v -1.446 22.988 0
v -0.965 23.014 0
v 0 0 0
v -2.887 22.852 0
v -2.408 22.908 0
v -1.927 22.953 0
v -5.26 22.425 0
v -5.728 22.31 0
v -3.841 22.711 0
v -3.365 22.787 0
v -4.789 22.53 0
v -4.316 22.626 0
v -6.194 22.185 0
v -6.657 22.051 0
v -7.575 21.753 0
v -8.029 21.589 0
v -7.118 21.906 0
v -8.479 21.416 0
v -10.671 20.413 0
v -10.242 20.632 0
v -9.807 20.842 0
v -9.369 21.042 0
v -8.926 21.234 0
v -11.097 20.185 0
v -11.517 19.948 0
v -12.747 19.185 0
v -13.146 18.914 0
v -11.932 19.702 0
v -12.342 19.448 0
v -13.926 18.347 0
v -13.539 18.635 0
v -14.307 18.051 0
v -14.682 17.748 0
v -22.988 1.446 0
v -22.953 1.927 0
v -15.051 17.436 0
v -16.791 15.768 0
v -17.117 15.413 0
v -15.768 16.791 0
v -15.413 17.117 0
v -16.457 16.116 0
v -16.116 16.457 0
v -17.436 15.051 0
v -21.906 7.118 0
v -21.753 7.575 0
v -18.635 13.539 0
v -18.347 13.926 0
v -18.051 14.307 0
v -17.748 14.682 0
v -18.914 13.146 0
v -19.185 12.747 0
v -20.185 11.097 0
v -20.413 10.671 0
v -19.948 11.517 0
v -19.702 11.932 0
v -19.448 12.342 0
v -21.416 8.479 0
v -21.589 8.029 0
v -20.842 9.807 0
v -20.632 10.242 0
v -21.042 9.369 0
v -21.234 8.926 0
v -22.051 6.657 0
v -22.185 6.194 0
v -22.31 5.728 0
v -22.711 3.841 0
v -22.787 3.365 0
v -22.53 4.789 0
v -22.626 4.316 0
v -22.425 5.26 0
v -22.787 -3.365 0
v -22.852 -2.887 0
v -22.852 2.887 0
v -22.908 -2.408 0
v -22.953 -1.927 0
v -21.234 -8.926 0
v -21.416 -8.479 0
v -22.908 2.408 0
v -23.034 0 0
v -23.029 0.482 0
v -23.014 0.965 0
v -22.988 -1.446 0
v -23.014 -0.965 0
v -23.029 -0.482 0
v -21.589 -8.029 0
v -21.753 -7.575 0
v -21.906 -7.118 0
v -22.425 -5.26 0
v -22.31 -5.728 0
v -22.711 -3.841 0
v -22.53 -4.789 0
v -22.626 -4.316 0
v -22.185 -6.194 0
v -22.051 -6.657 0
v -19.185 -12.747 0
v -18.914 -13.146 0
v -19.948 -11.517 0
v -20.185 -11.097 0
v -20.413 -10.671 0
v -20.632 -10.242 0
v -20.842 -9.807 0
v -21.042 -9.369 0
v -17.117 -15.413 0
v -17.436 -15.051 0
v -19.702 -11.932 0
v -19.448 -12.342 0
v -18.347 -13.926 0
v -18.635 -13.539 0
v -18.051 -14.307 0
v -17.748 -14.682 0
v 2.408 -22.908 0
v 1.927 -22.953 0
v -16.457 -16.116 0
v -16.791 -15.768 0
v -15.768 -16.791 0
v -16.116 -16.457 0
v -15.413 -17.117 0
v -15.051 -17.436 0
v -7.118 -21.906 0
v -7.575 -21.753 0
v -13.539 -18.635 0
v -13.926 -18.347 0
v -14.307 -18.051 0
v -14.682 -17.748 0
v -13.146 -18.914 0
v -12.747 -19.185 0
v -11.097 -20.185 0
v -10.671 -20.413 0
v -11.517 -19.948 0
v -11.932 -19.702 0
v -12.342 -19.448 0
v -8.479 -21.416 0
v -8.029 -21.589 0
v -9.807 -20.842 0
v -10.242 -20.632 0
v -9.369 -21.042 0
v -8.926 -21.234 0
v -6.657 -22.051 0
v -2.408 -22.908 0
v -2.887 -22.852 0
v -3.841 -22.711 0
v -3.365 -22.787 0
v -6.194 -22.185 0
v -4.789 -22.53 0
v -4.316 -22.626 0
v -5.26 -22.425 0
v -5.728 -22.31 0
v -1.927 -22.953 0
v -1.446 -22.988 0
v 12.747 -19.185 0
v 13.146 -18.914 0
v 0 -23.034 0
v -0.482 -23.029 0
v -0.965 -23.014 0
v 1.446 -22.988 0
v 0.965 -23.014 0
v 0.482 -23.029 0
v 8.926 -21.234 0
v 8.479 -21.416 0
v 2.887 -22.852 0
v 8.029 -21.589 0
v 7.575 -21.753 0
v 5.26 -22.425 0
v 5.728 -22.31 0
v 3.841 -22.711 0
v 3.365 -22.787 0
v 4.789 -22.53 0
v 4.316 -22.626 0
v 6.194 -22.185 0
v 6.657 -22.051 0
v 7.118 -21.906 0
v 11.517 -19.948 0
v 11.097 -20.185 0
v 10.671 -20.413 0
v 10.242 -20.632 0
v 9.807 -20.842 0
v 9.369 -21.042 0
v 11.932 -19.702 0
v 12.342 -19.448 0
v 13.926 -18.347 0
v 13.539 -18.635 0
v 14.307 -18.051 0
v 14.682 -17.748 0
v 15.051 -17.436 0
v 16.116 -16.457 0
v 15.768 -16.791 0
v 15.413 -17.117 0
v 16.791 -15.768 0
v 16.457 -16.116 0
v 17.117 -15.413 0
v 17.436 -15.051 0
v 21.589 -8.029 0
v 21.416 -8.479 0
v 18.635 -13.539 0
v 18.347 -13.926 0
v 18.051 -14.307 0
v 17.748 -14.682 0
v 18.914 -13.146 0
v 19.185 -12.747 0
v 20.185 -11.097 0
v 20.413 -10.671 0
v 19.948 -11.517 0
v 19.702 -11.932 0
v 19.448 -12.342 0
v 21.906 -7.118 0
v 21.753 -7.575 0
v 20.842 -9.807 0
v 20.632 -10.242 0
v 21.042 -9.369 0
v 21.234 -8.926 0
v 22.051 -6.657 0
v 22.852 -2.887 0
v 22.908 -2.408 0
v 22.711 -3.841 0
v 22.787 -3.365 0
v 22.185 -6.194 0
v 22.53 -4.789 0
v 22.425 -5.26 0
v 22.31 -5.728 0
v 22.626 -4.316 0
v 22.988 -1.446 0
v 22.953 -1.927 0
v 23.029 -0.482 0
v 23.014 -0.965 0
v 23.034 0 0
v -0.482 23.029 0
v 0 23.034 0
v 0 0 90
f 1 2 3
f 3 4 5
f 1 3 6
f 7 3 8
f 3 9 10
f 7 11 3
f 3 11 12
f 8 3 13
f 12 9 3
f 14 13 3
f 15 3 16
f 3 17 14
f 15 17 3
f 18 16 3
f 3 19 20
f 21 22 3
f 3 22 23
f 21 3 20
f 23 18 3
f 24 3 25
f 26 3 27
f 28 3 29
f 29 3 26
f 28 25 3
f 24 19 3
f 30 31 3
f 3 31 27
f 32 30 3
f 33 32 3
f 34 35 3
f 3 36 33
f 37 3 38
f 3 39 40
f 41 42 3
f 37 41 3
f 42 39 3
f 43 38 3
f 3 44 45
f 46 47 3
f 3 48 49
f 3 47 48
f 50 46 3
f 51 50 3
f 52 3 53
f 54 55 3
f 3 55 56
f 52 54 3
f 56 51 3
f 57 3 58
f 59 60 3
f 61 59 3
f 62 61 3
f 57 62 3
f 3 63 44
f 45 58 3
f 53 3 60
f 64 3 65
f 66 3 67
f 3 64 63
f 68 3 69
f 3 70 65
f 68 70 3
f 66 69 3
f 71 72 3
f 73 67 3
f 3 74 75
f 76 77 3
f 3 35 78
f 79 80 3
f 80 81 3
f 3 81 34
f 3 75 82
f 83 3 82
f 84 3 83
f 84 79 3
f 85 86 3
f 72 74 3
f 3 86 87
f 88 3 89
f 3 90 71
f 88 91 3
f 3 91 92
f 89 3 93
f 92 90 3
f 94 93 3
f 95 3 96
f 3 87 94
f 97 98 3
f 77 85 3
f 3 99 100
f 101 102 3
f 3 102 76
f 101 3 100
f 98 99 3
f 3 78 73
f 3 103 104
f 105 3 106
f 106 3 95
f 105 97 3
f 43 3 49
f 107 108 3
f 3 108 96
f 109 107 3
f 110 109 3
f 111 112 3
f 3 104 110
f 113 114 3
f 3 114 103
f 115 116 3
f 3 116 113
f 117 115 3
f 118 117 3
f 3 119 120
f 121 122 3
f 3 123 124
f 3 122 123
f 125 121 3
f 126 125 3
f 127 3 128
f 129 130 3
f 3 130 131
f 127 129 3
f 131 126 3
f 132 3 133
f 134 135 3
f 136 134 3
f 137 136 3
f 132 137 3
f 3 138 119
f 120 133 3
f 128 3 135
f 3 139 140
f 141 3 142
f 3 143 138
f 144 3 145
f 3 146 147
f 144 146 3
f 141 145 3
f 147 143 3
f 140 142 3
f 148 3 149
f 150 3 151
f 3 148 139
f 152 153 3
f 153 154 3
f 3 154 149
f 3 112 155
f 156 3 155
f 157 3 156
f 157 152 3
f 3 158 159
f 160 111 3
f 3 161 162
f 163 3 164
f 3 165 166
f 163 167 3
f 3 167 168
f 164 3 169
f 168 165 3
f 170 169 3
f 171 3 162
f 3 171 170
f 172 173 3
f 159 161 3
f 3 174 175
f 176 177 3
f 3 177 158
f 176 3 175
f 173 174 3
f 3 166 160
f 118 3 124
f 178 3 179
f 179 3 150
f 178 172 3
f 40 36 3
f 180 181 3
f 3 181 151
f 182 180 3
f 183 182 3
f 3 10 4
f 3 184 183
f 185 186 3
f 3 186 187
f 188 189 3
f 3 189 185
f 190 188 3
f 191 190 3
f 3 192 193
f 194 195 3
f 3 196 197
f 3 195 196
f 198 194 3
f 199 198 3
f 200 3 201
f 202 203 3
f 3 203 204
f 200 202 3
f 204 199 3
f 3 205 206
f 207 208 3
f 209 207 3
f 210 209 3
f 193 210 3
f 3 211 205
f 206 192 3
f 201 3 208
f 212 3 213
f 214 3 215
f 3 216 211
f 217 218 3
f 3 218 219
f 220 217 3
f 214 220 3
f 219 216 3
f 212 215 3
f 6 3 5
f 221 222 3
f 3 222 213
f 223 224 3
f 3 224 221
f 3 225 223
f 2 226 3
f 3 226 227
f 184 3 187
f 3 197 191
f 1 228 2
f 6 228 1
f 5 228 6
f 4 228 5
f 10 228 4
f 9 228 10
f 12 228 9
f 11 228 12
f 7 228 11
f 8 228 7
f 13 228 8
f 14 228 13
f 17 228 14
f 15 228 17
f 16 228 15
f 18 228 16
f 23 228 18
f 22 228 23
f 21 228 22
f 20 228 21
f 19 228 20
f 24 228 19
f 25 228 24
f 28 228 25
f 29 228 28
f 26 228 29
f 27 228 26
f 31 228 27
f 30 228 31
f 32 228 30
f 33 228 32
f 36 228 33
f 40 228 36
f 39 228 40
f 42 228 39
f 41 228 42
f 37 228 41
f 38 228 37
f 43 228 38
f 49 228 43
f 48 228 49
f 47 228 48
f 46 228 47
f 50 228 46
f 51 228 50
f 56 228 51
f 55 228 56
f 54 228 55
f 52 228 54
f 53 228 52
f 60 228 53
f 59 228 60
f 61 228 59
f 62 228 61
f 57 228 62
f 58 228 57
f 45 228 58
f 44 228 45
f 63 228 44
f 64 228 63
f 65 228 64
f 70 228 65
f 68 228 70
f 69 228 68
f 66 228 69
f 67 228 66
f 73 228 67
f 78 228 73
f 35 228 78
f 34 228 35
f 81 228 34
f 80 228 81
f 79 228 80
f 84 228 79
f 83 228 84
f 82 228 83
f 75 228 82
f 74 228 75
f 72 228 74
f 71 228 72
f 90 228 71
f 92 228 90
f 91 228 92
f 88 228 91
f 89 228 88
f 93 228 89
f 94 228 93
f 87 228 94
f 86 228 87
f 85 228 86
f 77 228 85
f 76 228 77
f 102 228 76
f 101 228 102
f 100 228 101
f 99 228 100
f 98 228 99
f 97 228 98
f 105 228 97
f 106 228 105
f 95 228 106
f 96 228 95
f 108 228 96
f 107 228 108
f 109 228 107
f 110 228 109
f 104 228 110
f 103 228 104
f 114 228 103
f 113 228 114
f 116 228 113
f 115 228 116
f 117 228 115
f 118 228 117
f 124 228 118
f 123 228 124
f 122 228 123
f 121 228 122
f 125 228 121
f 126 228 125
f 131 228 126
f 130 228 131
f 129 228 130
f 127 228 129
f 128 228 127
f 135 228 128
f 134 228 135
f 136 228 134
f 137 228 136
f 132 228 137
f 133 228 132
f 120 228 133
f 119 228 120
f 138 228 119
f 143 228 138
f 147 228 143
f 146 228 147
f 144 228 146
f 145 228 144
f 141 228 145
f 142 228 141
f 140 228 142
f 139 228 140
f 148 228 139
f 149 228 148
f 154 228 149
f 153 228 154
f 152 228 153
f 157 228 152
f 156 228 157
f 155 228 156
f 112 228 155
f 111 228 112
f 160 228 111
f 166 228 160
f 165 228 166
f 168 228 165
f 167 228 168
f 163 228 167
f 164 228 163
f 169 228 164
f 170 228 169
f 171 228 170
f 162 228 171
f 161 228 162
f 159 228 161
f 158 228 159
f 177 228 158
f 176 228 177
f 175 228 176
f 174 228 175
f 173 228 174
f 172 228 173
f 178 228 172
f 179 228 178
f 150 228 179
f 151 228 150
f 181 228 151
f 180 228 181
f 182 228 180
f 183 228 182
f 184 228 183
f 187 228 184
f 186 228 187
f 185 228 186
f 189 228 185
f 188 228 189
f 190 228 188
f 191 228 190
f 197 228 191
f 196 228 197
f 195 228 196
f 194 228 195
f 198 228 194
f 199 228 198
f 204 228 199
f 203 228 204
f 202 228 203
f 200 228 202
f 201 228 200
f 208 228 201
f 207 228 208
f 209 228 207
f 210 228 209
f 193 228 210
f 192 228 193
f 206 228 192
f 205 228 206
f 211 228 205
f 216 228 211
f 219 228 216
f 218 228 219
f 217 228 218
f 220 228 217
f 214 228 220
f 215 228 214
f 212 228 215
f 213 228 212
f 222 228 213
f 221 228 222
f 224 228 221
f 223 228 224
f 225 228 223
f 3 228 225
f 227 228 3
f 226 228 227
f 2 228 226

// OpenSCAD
offset = [0, 0];

// enter these three variables:

v = 50000; // volume in cubic mm (cc * 1000)
h = 90; // height in mm
n = 300; // number of sides (not including bottom)

// STL files don't have curves, so a cone must be approximated by using a large number for n. Depending on size, you'll want to find a value for area that results in a side length (check the console output) around 0.2-0.5mm. Sides shorter than this will not look smoother noticeably smoother once printed.

// the rest is calculated...

a = v / h * 3; // base-sectional area
s = 2 * sqrt(a * tan(180 / n) / n);
apothem = (2 * a / n / s);
r = apothem / cos(180 / n);

linear_extrude(h, scale = 0) translate(offset) difference(){
	circle(r, $fn = n);
	square(r);
}

echo(str("base-sectional area: ", a)); // base-sectional area
echo(str("side: ", s)); // side
echo(str("radius: ", r)); // radius
if((n % 2)) echo(str("radius + apothem: ", r + apothem)); // radius + apothem (only calculated for an odd number of sides)
echo(str("apothem: ", apothem)); // apothem
echo(str("circumscribed circle area: ", PI * pow(r, 2))); // circumscribed circle area
echo(str("inscribed circle area: ", PI * pow(apothem, 2))); // inscribed circle area
echo(str("polygon area: ", .5 * n * s * r * cos(180 / n))); // polygon area
